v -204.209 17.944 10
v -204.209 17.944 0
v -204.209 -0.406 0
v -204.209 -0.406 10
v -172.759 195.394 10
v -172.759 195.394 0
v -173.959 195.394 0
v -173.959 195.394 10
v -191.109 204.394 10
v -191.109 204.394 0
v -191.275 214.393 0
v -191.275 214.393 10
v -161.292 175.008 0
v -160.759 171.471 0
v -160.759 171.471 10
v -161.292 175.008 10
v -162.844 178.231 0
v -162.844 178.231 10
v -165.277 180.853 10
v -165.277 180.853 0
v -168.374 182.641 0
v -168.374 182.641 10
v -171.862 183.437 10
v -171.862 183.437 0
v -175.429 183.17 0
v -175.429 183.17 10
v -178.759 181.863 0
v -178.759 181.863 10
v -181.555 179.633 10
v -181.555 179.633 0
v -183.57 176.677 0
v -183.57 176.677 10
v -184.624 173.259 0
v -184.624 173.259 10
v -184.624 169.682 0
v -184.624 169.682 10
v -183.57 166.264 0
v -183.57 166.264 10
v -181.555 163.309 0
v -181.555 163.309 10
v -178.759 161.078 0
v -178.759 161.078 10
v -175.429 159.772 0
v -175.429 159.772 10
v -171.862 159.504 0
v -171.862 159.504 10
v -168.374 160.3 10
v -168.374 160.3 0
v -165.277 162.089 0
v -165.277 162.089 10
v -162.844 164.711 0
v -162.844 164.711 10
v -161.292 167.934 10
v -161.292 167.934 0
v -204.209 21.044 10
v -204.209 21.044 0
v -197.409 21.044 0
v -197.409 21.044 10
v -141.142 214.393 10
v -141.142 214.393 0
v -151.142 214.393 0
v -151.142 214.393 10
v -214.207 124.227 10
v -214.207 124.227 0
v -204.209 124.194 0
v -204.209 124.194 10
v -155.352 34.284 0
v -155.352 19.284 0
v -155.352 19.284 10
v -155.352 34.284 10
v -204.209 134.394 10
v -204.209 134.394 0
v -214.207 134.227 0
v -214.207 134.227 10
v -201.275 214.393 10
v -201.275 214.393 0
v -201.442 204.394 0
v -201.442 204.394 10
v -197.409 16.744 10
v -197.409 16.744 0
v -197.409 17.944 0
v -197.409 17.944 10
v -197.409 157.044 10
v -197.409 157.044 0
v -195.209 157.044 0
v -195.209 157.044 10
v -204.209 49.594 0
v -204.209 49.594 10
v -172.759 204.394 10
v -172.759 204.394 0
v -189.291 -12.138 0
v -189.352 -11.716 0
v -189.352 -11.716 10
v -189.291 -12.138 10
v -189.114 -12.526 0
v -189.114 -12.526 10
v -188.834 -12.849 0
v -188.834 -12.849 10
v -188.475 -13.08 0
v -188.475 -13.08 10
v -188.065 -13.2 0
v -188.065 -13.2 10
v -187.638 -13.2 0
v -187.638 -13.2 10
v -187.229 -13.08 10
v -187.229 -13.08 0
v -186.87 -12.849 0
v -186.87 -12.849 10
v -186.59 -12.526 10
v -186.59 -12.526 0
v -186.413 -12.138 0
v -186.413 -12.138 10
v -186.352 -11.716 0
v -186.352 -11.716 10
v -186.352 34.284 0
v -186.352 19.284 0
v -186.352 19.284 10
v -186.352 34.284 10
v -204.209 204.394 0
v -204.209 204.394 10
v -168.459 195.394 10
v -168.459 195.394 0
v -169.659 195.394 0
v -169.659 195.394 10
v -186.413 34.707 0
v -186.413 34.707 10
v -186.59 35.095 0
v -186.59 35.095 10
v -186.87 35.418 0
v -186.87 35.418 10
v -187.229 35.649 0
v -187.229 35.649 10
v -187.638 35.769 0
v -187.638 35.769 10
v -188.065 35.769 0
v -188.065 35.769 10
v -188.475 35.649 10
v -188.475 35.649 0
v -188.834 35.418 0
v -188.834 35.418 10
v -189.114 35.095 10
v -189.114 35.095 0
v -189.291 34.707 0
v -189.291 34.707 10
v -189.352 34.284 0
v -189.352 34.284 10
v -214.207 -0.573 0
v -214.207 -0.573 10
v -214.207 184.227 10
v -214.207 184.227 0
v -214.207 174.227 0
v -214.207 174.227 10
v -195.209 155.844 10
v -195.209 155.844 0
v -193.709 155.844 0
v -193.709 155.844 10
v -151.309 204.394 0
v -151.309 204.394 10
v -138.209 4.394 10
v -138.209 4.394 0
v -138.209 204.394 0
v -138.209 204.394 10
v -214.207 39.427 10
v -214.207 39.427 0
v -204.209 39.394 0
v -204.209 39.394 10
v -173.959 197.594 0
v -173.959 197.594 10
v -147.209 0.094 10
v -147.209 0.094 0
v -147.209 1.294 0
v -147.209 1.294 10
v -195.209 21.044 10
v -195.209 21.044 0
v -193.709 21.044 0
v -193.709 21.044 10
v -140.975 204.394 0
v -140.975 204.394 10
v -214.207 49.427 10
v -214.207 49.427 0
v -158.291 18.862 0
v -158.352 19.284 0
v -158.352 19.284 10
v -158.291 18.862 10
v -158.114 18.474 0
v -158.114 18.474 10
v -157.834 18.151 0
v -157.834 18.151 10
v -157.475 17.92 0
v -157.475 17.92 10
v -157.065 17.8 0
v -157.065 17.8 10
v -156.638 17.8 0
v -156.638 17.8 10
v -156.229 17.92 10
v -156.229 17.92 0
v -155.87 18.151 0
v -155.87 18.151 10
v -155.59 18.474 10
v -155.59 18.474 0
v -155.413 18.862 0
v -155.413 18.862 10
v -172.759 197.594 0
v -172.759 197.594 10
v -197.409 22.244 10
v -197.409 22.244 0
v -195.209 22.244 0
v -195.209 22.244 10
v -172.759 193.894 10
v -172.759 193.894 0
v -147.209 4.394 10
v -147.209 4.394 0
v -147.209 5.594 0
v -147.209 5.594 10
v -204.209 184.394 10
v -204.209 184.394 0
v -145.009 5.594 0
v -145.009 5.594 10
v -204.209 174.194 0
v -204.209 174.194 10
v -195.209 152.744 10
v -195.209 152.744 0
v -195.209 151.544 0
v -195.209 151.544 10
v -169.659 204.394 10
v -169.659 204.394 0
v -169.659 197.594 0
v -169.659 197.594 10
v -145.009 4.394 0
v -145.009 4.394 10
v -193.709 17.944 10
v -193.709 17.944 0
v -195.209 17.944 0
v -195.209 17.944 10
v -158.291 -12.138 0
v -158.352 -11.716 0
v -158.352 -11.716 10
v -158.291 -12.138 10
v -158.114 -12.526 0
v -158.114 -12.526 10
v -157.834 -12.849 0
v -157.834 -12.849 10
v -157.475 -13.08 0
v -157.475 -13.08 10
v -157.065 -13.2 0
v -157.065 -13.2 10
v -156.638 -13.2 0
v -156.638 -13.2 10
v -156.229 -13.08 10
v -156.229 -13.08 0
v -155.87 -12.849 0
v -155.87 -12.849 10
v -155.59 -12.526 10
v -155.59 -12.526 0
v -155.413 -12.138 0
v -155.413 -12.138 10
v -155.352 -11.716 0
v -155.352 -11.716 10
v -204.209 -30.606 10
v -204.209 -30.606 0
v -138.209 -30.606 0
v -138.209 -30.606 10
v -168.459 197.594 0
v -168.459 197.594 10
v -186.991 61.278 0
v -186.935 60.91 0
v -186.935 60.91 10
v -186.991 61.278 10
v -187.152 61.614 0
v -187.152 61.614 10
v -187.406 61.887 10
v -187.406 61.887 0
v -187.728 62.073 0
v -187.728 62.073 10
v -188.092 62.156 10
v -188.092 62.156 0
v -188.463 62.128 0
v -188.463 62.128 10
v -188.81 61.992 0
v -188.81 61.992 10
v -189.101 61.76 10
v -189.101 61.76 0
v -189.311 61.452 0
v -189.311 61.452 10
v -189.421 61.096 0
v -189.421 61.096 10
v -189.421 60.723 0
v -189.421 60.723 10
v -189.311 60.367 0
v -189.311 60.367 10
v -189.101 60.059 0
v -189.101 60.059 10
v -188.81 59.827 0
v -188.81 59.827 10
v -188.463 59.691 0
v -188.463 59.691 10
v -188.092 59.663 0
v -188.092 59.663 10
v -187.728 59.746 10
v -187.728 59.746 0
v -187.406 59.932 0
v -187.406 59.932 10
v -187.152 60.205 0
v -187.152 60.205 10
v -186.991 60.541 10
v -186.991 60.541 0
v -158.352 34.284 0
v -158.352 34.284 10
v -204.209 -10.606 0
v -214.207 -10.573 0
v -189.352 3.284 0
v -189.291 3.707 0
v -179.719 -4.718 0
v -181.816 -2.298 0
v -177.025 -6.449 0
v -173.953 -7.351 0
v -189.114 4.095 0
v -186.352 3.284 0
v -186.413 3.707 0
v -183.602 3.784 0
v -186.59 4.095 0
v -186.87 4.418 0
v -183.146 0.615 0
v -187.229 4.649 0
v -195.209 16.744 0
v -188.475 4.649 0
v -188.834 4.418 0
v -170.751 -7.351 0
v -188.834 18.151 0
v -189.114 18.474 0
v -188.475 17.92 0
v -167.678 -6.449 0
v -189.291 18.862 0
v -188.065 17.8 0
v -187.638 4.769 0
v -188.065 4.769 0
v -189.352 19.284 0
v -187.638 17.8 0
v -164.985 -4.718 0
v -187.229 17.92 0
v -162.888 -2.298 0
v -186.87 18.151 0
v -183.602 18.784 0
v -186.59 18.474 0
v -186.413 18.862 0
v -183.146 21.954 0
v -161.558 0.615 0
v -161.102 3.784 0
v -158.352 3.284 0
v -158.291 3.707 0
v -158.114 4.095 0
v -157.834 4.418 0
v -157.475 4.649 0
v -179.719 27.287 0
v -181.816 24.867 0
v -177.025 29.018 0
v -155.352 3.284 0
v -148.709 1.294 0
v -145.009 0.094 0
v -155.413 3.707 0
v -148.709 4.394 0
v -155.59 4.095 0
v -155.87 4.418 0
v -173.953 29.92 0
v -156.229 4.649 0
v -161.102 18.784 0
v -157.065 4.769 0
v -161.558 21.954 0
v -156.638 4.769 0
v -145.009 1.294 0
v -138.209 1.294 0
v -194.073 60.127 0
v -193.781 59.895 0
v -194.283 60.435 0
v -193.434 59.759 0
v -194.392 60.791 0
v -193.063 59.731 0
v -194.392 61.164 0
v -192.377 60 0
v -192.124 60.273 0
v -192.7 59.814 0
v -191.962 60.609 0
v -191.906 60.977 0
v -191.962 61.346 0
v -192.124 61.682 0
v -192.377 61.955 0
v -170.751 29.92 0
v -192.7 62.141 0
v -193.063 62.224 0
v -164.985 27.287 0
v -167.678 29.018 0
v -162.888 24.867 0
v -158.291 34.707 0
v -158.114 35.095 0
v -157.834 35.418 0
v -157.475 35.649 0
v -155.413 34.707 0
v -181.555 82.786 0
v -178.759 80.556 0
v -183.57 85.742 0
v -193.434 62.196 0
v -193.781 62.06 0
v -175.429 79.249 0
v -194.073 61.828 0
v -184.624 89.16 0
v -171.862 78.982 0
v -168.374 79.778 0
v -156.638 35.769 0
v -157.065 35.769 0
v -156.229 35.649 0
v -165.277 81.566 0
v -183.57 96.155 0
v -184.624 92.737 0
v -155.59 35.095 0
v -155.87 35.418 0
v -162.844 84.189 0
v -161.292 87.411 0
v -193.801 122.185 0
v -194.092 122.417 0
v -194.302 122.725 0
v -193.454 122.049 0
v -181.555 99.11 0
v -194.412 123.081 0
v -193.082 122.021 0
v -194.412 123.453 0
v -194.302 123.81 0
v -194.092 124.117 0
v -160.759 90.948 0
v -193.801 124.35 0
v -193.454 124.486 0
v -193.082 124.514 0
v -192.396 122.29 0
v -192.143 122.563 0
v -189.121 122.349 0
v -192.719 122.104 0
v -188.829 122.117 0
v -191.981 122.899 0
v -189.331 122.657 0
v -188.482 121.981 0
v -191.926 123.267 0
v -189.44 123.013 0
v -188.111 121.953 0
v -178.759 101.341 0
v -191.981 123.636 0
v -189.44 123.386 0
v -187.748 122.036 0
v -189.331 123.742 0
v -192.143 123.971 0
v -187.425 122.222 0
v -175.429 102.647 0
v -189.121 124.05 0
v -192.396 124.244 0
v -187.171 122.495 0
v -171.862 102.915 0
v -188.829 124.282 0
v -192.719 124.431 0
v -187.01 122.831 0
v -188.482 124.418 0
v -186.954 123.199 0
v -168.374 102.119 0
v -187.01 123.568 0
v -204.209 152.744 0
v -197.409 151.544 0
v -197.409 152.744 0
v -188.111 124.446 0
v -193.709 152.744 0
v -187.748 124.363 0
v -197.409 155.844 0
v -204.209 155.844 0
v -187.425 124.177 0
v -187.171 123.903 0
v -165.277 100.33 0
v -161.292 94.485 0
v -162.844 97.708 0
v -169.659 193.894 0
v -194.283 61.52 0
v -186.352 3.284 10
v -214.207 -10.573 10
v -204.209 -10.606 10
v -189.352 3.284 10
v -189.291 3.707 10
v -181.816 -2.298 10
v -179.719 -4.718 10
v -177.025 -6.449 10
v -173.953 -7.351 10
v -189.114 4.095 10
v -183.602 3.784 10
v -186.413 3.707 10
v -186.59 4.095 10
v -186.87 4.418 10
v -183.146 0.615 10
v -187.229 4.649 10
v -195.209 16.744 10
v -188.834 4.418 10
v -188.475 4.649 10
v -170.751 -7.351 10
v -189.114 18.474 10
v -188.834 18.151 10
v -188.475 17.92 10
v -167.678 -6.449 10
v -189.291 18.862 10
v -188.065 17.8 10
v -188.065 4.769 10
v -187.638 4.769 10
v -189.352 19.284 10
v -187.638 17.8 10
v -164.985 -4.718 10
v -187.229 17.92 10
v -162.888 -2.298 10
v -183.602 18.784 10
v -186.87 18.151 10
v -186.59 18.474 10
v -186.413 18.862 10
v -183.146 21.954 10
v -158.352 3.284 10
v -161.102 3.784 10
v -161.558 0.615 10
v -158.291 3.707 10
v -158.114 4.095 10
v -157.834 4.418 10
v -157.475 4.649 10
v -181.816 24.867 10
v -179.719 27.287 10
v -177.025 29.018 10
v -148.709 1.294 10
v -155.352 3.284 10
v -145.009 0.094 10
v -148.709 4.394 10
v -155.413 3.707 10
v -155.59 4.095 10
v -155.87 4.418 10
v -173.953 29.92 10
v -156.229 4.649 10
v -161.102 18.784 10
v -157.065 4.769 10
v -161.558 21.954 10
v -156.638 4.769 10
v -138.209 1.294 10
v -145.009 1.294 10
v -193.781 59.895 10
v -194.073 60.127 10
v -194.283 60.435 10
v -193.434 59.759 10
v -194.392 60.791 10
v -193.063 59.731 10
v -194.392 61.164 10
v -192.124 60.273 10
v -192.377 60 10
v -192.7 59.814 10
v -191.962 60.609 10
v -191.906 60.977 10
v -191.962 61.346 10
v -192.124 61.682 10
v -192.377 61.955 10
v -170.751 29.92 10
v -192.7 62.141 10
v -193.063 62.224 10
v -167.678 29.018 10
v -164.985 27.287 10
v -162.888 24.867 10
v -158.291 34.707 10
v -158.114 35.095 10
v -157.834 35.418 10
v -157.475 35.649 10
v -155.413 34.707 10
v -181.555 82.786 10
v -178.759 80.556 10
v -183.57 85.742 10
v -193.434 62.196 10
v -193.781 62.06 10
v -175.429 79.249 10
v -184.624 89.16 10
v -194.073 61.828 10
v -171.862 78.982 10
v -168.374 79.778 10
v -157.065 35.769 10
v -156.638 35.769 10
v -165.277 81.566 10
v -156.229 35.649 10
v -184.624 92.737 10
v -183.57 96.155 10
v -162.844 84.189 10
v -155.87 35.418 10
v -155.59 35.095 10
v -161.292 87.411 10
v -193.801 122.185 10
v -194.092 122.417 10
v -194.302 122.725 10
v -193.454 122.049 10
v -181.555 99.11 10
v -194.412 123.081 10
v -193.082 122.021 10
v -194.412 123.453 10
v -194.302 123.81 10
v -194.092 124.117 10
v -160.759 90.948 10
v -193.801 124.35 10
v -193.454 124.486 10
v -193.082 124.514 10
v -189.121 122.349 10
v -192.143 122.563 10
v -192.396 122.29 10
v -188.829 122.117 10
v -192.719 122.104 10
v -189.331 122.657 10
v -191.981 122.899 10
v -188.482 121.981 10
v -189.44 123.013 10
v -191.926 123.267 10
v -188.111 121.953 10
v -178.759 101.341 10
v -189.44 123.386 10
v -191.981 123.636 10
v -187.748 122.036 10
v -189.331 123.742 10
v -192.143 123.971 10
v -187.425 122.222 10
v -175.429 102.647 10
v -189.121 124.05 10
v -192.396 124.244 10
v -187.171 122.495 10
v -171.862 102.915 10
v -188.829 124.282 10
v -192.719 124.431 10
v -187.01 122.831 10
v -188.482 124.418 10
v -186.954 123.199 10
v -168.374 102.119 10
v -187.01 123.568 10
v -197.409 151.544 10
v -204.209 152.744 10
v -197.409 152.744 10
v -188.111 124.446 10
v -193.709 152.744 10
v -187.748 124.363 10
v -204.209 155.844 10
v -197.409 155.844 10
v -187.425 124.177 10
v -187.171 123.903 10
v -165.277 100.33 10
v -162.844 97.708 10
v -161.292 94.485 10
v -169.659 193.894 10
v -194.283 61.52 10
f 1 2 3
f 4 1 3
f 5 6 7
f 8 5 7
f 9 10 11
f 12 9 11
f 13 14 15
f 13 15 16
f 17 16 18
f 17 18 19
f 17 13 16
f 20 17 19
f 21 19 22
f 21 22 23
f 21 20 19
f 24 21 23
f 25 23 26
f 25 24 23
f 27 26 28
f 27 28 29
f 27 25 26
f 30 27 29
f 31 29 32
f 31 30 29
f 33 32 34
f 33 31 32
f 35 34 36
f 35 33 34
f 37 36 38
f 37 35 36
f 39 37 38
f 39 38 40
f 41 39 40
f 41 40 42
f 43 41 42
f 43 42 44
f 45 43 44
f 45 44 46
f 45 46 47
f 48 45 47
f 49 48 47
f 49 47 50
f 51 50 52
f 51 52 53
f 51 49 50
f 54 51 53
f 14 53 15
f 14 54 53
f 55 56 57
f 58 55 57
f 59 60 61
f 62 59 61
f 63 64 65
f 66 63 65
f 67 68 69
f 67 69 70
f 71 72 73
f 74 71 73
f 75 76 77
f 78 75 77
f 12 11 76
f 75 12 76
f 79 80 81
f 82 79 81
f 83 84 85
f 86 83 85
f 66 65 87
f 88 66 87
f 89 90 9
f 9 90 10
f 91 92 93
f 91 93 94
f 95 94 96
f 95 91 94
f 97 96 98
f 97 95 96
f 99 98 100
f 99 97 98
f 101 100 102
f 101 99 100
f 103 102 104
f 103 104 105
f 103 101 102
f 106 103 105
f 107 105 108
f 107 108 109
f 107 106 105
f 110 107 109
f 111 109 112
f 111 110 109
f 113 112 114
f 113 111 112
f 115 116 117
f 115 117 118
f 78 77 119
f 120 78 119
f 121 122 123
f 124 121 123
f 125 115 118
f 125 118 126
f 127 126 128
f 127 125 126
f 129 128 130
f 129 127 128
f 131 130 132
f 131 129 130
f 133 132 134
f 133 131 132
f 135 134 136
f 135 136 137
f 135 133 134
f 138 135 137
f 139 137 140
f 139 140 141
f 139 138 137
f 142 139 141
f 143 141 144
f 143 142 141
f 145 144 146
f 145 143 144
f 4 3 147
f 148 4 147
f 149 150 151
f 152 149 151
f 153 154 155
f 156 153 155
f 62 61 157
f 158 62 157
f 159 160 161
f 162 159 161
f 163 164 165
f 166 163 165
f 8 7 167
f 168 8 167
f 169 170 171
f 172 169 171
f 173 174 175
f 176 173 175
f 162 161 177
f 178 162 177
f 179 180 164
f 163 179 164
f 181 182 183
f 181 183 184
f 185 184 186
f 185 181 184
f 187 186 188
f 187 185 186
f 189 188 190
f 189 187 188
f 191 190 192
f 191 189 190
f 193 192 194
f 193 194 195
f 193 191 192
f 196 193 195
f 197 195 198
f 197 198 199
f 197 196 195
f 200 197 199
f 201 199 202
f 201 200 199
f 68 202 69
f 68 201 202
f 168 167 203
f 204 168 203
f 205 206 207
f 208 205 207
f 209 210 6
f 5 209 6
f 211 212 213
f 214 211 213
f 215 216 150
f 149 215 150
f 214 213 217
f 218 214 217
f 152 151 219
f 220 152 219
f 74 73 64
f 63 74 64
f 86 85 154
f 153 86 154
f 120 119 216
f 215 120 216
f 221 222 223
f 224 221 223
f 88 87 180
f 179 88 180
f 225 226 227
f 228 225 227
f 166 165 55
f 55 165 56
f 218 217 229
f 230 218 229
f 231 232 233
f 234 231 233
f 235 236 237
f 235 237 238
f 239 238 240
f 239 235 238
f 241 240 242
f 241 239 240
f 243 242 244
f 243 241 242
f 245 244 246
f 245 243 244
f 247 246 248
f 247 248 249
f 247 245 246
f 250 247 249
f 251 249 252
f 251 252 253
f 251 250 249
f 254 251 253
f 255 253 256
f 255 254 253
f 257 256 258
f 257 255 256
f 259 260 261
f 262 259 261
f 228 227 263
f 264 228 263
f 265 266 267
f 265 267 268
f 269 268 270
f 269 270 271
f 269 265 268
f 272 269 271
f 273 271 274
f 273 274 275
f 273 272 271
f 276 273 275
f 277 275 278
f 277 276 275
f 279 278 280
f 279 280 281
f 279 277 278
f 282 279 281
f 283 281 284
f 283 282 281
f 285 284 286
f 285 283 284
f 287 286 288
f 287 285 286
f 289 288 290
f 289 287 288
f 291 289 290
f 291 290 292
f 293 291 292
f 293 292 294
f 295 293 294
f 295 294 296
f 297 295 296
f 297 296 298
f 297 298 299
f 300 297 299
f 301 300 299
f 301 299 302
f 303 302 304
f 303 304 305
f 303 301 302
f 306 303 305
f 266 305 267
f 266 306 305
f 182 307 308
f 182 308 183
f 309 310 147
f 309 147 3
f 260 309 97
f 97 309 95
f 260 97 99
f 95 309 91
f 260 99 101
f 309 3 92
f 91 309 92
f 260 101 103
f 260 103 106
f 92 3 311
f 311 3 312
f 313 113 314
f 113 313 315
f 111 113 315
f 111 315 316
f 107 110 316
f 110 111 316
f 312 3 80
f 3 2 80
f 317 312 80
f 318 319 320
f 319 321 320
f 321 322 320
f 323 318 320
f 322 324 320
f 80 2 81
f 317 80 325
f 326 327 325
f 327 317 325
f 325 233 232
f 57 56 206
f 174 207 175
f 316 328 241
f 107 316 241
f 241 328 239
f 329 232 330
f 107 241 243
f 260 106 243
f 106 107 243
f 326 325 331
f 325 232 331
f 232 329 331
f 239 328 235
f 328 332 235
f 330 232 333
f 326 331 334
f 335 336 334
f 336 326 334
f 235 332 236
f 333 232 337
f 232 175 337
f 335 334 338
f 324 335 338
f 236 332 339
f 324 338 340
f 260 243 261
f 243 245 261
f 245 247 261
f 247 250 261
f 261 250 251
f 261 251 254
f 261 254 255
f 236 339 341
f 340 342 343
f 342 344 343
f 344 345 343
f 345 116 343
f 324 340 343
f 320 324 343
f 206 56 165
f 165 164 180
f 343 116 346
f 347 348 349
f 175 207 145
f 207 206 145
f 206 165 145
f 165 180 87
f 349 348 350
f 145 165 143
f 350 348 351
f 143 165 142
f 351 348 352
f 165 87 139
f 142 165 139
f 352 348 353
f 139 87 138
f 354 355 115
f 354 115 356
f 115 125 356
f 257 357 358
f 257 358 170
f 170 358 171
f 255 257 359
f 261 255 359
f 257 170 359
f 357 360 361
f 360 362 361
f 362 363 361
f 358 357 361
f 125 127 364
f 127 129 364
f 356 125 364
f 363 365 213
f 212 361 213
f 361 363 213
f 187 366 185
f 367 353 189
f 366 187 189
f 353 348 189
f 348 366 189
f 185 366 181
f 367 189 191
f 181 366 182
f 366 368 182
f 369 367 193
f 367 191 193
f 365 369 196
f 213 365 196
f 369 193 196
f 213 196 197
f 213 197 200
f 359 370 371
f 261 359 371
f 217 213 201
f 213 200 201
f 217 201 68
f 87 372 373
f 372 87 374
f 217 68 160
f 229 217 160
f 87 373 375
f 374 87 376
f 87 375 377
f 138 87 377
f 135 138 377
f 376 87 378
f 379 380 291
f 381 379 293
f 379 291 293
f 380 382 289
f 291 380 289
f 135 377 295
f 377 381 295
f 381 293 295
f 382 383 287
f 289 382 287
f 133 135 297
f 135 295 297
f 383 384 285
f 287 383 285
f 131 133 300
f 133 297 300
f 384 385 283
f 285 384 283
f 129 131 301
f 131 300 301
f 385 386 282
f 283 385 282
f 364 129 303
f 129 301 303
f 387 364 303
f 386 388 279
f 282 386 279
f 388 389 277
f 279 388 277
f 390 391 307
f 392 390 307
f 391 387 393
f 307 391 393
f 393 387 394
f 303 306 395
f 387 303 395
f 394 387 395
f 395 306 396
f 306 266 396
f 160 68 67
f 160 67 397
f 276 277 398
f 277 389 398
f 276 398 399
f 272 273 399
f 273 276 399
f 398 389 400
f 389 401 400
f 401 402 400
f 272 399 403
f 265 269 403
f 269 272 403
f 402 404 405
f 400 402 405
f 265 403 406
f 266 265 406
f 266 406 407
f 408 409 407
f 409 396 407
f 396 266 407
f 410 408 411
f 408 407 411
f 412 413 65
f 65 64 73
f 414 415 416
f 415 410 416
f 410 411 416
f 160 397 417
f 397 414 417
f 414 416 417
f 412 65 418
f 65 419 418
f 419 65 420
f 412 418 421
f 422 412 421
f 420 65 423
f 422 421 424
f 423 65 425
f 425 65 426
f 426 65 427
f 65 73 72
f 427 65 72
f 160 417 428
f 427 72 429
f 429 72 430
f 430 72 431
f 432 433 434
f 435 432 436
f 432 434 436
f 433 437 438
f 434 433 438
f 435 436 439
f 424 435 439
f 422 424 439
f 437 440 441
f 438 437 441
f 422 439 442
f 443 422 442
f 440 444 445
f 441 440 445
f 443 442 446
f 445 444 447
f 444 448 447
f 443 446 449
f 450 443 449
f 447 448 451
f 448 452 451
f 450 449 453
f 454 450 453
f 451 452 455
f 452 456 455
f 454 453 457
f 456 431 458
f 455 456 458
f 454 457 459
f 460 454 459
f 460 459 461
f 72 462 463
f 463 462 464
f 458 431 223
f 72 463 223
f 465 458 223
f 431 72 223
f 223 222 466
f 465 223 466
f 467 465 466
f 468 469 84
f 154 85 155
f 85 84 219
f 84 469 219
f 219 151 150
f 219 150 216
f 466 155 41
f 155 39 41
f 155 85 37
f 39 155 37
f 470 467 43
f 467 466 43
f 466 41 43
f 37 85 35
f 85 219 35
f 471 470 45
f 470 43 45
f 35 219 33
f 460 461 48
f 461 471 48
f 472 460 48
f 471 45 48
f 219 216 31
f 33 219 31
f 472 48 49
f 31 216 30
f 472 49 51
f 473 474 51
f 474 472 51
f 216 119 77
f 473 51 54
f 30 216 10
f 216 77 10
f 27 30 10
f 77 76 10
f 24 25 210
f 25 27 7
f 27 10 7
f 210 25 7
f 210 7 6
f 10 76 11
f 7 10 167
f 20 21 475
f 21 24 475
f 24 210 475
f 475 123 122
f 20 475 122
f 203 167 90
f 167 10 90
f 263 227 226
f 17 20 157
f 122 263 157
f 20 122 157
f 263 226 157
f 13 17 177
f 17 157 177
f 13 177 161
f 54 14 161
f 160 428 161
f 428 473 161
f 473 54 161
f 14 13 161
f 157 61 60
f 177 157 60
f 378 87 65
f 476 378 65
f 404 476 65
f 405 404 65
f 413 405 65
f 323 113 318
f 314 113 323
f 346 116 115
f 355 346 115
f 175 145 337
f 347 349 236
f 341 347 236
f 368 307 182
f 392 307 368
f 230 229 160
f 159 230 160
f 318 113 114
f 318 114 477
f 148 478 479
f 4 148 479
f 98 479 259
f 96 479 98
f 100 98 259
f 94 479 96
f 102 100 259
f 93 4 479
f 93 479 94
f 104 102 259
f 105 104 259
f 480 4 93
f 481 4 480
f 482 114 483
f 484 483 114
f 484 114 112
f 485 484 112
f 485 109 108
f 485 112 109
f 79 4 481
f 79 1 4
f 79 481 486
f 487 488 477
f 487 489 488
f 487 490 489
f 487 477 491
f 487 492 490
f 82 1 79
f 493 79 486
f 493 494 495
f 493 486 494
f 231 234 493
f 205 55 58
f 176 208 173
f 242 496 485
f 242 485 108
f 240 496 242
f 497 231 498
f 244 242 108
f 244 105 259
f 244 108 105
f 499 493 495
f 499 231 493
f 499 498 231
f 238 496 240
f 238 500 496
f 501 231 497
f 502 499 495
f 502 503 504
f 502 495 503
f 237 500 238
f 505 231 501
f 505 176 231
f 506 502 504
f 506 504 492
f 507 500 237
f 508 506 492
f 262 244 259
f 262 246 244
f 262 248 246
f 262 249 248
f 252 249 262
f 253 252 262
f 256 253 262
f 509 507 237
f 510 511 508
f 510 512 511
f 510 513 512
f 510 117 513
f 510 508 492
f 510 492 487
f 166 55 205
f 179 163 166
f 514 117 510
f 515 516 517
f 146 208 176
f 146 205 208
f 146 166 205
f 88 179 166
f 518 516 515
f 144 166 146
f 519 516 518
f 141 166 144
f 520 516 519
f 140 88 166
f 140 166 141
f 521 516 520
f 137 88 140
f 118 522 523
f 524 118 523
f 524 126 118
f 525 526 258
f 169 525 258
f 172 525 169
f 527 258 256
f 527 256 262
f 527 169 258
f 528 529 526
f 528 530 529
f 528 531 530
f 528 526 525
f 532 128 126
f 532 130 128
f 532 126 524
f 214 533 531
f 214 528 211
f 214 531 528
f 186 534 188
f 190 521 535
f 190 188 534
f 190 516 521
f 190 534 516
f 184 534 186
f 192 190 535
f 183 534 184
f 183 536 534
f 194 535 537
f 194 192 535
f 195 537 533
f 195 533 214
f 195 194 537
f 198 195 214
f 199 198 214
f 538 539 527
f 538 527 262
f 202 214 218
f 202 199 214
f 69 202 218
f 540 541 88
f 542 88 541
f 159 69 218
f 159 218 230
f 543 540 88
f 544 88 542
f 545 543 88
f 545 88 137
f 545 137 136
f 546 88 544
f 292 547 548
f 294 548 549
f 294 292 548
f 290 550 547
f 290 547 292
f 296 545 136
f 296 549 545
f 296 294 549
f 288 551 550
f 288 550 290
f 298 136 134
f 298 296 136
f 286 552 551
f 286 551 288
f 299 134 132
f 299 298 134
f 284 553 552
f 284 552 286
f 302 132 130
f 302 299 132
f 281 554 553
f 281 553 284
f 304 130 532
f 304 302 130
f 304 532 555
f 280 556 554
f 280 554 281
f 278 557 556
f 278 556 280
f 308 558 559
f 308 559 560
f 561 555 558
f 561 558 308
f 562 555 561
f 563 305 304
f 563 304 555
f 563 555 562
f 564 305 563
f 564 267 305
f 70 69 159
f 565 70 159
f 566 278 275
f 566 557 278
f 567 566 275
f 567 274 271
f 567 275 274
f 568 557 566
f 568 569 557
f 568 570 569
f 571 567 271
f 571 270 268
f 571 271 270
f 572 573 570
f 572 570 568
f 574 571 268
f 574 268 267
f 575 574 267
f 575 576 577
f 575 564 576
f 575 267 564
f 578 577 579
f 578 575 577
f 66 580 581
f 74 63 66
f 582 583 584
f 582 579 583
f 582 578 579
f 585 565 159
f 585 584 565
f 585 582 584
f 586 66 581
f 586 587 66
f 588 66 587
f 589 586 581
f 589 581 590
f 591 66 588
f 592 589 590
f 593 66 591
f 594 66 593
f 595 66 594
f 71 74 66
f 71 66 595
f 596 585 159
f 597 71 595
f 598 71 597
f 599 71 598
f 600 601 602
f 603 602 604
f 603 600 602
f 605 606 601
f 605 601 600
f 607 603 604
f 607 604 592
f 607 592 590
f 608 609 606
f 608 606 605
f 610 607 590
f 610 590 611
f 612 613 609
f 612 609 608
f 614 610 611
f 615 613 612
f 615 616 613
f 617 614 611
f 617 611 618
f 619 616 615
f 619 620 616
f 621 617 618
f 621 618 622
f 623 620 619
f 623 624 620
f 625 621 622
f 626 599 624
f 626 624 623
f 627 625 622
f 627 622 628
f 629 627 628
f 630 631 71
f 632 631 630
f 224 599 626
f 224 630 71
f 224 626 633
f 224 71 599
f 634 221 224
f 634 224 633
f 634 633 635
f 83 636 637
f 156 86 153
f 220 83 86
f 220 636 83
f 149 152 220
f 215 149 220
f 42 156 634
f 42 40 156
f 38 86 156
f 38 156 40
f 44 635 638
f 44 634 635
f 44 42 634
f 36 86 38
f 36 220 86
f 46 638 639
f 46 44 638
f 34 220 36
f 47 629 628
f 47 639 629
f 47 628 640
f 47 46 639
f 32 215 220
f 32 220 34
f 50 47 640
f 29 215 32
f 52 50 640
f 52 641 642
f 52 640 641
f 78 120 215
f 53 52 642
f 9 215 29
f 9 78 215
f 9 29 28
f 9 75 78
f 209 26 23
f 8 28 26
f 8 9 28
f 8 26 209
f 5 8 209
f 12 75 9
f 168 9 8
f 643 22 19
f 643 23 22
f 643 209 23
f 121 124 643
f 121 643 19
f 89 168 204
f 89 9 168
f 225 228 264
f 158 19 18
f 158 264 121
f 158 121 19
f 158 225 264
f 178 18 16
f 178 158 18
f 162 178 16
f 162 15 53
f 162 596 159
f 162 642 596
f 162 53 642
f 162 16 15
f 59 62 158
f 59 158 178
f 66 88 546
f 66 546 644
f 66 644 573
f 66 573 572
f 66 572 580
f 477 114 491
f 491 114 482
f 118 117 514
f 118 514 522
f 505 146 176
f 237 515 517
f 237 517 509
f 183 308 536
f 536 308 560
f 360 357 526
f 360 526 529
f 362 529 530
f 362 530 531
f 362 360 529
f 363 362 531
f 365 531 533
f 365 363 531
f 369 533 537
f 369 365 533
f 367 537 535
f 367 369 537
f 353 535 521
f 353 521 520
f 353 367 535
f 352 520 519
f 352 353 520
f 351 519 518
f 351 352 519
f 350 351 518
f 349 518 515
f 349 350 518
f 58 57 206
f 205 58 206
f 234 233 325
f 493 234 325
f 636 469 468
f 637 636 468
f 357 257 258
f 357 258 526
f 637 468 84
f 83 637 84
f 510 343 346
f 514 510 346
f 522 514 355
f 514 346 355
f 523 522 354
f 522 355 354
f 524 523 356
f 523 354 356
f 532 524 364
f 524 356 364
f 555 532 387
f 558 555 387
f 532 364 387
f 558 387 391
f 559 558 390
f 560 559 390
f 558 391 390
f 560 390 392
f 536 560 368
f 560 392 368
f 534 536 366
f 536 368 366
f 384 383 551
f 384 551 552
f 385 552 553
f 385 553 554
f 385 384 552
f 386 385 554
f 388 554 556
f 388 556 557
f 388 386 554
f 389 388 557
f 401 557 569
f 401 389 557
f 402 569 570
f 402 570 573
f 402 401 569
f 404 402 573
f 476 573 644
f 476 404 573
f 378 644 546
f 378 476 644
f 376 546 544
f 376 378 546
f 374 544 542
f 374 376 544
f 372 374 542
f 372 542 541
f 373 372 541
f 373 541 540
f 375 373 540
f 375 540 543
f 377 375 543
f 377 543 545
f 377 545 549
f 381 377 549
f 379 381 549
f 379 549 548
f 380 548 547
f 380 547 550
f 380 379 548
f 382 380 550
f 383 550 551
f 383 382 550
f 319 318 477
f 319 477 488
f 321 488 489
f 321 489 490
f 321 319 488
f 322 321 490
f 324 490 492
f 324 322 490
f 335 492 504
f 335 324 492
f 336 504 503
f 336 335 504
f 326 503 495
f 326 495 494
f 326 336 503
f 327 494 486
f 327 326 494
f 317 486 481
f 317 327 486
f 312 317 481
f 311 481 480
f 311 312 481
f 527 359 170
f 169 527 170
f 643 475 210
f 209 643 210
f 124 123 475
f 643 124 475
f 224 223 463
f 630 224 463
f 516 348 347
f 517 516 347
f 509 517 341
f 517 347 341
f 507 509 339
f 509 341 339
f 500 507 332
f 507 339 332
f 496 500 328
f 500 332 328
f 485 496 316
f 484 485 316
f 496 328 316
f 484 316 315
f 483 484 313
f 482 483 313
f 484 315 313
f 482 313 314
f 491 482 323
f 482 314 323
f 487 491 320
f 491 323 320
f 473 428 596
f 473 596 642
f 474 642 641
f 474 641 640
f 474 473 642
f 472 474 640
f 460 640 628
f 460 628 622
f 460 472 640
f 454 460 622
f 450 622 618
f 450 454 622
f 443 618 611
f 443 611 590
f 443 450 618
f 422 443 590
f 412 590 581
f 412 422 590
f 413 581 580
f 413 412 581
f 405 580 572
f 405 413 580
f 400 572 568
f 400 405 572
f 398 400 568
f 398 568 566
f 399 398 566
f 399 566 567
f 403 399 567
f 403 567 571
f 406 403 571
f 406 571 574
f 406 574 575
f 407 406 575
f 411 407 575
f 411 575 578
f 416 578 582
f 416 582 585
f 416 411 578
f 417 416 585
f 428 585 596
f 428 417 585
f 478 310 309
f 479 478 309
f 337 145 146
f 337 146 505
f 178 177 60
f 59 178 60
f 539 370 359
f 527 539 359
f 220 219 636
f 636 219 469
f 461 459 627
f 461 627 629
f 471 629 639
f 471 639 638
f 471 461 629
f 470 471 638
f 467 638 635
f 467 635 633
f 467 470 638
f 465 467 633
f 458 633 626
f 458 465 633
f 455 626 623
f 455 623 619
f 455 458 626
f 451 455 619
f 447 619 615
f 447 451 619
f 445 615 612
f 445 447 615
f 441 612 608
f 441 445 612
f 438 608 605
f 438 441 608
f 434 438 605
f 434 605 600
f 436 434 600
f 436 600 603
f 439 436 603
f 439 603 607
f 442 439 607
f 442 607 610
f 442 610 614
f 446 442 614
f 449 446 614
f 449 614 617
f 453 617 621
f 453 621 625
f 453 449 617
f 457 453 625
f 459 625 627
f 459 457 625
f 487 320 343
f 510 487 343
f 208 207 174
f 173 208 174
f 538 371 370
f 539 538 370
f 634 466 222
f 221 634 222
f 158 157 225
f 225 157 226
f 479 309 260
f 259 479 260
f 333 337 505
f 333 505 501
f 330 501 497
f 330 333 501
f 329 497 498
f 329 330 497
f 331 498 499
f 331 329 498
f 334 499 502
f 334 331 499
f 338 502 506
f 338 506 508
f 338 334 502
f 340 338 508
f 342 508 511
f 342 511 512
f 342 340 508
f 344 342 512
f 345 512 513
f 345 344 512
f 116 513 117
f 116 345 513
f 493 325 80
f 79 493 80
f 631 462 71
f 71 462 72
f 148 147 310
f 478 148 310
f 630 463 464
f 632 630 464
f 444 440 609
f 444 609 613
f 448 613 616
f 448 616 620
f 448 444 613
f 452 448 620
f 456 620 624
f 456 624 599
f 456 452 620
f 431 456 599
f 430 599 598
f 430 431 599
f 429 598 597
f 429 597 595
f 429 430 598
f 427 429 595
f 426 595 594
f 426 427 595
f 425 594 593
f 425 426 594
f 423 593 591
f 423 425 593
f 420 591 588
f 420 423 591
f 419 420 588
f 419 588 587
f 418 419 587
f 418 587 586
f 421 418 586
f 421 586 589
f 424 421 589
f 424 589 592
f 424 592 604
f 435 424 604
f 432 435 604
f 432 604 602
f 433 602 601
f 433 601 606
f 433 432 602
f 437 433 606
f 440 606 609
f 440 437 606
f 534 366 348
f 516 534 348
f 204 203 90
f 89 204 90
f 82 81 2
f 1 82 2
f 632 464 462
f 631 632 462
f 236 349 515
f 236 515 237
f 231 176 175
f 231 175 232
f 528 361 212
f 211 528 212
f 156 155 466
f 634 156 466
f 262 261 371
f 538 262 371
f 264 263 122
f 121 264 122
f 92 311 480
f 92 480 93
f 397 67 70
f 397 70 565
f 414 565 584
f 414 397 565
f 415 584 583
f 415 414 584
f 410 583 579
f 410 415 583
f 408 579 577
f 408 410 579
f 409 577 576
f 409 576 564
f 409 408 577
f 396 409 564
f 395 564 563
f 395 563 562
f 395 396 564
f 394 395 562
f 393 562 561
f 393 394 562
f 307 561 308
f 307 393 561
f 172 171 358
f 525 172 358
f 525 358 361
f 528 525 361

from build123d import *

# Parameters (mm, degrees)
SKETCH_1_R      = 12
SKETCH_1_R_2    = 1.25
EXTRUDE_1_DEPTH = 10


with BuildPart() as part:
    # Эскиз1 → Бобышка-Вытянуть1 (new body)
    with BuildSketch(Plane.XY):
        Polygon((-204.208503022, -30.605986098), (-138.208503022, -30.605986098), (-138.208503022, 1.294013902), (-145.008503022, 1.294013902), (-145.008503022, 0.094013902), (-147.208503022, 0.094013902), (-147.208503022, 1.294013902), (-148.708503022, 1.294013902), (-148.708503022, 4.394013902), (-147.208503022, 4.394013902), (-147.208503022, 5.594013902), (-145.008503022, 5.594013902), (-145.008503022, 4.394013902), (-138.208503022, 4.394013902), (-138.208503022, 204.394013902), (-140.975215975, 204.394013902), (-141.141859499, 214.392625303), (-151.141859499, 214.392625303), (-151.308503022, 204.394013902), (-169.658503022, 204.394013902), (-169.658503022, 197.594013902), (-168.458503022, 197.594013902), (-168.458503022, 195.394013902), (-169.658503022, 195.394013902), (-169.658503022, 193.894013902), (-172.758503022, 193.894013902), (-172.758503022, 195.394013902), (-173.958503022, 195.394013902), (-173.958503022, 197.594013902), (-172.758503022, 197.594013902), (-172.758503022, 204.394013902), (-191.108503022, 204.394013902), (-191.275146545, 214.392625303), (-201.275146545, 214.392625303), (-201.441790069, 204.394013902), (-204.208503022, 204.394013902), (-204.208503022, 184.394013902), (-214.207114422, 184.227370379), (-214.207114422, 174.227370379), (-204.208503022, 174.194013902), (-204.208503022, 155.844013902), (-197.408503022, 155.844013902), (-197.408503022, 157.044013902), (-195.208503022, 157.044013902), (-195.208503022, 155.844013902), (-193.708503022, 155.844013902), (-193.708503022, 152.744013902), (-195.208503022, 152.744013902), (-195.208503022, 151.544013902), (-197.408503022, 151.544013902), (-197.408503022, 152.744013902), (-204.208503022, 152.744013902), (-204.208503022, 134.394013902), (-214.207114422, 134.227370379), (-214.207114422, 124.227370379), (-204.208503022, 124.194013902), (-204.208503022, 49.594013902), (-214.207114422, 49.427370379), (-214.207114422, 39.427370379), (-204.208503022, 39.394013902), (-204.208503022, 21.044013902), (-197.408503022, 21.044013902), (-197.408503022, 22.244013902), (-195.208503022, 22.244013902), (-195.208503022, 21.044013902), (-193.708503022, 21.044013902), (-193.708503022, 17.944013902), (-195.208503022, 17.944013902), (-195.208503022, 16.744013902), (-197.408503022, 16.744013902), (-197.408503022, 17.944013902), (-204.208503022, 17.944013902), (-204.208503022, -0.405986098), (-214.207114422, -0.572629621), (-214.207114422, -10.572629621), (-204.208503022, -10.605986098), align=None)
        with Locations((-172.758503022, 171.470752074)):
            Circle(SKETCH_1_R, mode=Mode.SUBTRACT)
        with Locations((-172.758503022, 90.948356806)):
            Circle(SKETCH_1_R, mode=Mode.SUBTRACT)
        with Locations((-188.184986495, 60.909591185)):
            Circle(SKETCH_1_R_2, mode=Mode.SUBTRACT)
        with Locations((-193.156341495, 60.977449185)):
            Circle(SKETCH_1_R_2, mode=Mode.SUBTRACT)
        with Locations((-188.204296495, 123.199321185)):
            Circle(SKETCH_1_R_2, mode=Mode.SUBTRACT)
        with Locations((-193.175651495, 123.267179185)):
            Circle(SKETCH_1_R_2, mode=Mode.SUBTRACT)
        with BuildLine():
            Line((-186.351911088, 19.284478243), (-186.351911088, 34.284478243))
            ThreePointArc((-186.351911088, 34.284478243), (-187.851911088, 35.784478243), (-189.351911088, 34.284478243))
            Line((-189.351911088, 34.284478243), (-189.351911088, 19.284478243))
            ThreePointArc((-189.351911088, 19.284478243), (-187.851911088, 17.784478243), (-186.351911088, 19.284478243))
        make_face(mode=Mode.SUBTRACT)
        with BuildLine():
            Line((-155.351911088, 19.284478243), (-155.351911088, 34.284478243))
            ThreePointArc((-155.351911088, 34.284478243), (-156.851911088, 35.784478243), (-158.351911088, 34.284478243))
            Line((-158.351911088, 34.284478243), (-158.351911088, 19.284478243))
            ThreePointArc((-158.351911088, 19.284478243), (-156.851911088, 17.784478243), (-155.351911088, 19.284478243))
        make_face(mode=Mode.SUBTRACT)
        with BuildLine():
            Line((-155.351911088, -11.715521757), (-155.351911088, 3.284478243))
            ThreePointArc((-155.351911088, 3.284478243), (-156.851911088, 4.784478243), (-158.351911088, 3.284478243))
            Line((-158.351911088, 3.284478243), (-158.351911088, -11.715521757))
            ThreePointArc((-158.351911088, -11.715521757), (-156.851911088, -13.215521757), (-155.351911088, -11.715521757))
        make_face(mode=Mode.SUBTRACT)
        with BuildLine():
            Line((-186.351911088, -11.715521757), (-186.351911088, 3.284478243))
            ThreePointArc((-186.351911088, 3.284478243), (-187.851911088, 4.784478243), (-189.351911088, 3.284478243))
            Line((-189.351911088, 3.284478243), (-189.351911088, -11.715521757))
            ThreePointArc((-189.351911088, -11.715521757), (-187.851911088, -13.215521757), (-186.351911088, -11.715521757))
        make_face(mode=Mode.SUBTRACT)
        with BuildLine():
            Line((-183.601911088, 3.784478243), (-183.601911088, 18.784478243))
            ThreePointArc((-183.601911088, 18.784478243), (-172.351911088, 30.034478243), (-161.101911088, 18.784478243))
            Line((-161.101911088, 18.784478243), (-161.101911088, 3.784478243))
            ThreePointArc((-161.101911088, 3.784478243), (-172.351911088, -7.465521757), (-183.601911088, 3.784478243))
        make_face(mode=Mode.SUBTRACT)
    extrude(amount=EXTRUDE_1_DEPTH)


solid = part.part
